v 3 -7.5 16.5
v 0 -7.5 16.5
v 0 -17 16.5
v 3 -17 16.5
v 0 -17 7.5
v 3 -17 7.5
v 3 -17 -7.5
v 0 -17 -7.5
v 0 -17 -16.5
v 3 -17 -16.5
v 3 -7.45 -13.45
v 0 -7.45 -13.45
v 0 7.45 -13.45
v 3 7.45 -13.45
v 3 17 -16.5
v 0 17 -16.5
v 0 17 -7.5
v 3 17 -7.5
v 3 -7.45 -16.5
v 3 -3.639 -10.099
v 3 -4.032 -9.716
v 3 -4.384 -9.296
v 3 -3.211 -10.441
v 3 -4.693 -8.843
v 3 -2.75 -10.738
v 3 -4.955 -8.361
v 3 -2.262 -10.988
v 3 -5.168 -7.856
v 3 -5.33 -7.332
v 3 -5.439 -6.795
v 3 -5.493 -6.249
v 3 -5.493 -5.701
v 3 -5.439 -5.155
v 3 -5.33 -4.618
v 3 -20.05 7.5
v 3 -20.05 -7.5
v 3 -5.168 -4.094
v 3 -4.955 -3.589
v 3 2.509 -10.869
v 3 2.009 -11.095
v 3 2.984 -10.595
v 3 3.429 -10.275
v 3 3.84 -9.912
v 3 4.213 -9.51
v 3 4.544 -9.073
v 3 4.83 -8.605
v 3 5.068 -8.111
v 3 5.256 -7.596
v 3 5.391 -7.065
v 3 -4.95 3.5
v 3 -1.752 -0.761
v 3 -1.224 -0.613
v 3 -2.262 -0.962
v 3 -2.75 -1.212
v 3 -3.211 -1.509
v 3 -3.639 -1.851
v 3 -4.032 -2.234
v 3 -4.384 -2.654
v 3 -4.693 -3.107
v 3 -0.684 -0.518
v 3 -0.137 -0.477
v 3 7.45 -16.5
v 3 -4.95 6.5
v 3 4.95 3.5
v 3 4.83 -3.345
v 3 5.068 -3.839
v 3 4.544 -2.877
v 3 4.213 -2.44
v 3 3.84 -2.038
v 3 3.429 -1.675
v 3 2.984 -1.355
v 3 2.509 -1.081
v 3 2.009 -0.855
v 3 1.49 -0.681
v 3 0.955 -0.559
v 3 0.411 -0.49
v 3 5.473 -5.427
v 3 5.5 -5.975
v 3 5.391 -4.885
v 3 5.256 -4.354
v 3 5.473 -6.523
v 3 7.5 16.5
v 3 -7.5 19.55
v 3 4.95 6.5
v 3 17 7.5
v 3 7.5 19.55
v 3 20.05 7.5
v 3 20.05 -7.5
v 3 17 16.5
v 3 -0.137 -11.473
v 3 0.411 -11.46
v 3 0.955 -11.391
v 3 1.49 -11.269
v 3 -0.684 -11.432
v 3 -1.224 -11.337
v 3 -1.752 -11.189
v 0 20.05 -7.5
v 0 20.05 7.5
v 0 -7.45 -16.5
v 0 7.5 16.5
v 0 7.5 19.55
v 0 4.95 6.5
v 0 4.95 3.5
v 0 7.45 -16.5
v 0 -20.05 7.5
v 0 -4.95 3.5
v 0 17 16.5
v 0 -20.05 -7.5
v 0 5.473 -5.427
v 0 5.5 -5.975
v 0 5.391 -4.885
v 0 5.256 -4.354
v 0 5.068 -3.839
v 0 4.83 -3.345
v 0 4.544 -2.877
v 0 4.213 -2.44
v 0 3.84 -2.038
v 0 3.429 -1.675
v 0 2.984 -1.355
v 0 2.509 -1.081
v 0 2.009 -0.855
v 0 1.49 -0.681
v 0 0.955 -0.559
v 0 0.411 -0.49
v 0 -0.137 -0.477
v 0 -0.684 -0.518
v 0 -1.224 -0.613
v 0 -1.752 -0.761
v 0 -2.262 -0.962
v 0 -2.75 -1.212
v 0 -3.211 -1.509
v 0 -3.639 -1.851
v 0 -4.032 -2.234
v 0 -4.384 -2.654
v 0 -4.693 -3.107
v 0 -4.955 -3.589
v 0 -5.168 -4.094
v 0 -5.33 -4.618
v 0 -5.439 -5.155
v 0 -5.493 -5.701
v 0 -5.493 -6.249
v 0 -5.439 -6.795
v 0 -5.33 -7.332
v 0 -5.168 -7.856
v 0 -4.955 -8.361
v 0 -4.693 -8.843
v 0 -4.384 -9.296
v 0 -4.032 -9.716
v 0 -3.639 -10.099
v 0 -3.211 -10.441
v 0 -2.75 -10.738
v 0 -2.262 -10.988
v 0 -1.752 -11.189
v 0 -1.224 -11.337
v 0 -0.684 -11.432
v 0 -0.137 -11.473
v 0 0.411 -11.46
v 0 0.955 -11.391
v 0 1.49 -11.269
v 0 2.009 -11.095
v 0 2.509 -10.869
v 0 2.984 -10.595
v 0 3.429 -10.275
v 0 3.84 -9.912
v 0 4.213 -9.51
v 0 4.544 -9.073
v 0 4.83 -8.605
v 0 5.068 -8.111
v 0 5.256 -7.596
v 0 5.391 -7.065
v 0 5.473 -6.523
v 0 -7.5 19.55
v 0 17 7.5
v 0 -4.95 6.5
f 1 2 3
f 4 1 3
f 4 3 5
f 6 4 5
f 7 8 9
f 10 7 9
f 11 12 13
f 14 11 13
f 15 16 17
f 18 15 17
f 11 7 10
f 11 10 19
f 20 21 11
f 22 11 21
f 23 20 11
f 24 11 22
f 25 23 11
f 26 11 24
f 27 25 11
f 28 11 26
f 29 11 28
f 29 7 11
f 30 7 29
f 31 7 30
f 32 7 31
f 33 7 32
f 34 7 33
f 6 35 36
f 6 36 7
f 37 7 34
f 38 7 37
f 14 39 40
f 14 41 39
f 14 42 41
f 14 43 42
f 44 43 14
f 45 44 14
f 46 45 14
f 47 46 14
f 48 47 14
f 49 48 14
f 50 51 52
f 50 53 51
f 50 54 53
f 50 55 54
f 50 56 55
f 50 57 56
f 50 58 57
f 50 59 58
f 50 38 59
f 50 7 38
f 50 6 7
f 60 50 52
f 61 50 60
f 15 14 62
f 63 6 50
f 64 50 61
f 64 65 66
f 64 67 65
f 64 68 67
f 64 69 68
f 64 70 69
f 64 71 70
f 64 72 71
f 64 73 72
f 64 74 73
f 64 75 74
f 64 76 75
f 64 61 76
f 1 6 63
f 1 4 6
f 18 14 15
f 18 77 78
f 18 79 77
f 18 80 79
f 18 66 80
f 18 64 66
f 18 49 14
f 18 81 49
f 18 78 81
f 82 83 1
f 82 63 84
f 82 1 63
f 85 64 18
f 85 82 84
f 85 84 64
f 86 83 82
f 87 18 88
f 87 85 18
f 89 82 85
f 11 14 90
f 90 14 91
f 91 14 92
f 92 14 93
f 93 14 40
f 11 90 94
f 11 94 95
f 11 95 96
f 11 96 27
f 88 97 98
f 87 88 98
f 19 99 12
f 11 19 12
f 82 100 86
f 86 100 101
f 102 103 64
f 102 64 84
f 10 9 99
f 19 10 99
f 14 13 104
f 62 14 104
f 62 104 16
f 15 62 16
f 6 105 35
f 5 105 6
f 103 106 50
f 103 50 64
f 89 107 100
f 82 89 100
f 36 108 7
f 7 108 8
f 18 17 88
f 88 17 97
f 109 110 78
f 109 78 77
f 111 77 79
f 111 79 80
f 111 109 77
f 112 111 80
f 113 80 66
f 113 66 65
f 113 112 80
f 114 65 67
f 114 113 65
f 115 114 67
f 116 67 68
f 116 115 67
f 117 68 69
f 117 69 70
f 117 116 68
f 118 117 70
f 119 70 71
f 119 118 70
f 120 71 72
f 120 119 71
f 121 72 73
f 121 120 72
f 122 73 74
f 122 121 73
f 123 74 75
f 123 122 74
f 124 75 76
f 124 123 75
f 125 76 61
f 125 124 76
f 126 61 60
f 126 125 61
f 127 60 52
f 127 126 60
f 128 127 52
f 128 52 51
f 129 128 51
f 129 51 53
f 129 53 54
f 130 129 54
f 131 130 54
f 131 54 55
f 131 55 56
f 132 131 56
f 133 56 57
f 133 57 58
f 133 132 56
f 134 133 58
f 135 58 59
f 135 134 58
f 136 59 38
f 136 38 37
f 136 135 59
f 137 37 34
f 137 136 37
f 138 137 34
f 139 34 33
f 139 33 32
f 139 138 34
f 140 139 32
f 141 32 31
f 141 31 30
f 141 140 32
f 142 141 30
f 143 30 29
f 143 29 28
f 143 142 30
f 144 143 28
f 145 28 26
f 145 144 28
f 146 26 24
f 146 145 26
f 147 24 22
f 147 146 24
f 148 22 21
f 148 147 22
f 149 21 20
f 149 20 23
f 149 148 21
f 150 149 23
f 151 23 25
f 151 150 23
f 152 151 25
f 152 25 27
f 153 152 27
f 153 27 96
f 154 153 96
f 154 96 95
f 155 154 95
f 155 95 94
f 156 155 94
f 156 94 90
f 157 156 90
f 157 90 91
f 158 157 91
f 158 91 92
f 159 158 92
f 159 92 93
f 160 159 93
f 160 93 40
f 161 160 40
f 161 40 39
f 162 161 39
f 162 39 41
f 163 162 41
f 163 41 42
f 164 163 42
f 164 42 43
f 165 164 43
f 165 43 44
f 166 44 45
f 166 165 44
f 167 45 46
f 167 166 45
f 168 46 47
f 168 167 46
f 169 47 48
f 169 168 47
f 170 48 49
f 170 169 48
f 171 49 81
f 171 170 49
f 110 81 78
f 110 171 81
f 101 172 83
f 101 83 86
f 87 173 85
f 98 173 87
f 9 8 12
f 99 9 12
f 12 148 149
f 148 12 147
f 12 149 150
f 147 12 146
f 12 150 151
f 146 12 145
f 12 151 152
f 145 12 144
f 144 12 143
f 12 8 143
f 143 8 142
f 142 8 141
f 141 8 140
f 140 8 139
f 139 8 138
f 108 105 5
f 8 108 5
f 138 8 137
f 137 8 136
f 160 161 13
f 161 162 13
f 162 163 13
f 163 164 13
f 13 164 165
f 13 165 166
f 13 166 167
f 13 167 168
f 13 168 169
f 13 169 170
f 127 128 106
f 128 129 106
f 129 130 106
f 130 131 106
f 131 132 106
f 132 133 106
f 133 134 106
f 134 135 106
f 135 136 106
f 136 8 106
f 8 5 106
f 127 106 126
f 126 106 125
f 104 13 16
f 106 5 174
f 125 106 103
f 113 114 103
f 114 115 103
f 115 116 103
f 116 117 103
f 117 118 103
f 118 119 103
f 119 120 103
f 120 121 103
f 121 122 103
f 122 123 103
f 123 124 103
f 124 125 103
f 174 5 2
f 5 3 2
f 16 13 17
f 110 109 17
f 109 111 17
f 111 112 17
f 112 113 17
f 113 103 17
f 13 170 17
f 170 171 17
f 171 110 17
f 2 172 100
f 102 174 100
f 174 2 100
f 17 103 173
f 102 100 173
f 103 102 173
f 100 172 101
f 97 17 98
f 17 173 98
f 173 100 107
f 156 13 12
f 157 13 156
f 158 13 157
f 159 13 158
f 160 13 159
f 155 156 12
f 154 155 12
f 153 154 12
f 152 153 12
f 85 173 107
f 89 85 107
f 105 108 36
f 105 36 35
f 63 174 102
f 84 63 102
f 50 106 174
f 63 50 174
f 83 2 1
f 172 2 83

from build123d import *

# Parameters (mm, degrees)
F0_R     = 5.5
F0_W     = 9.9
F0_H     = 3
F0_W_2   = 15
F0_H_2   = 3.05
F0_W_3   = 3.05
F0_H_3   = 15
F1_DEPTH = 3


with BuildPart() as f1:
    # F0 (on Right) → F1 (new body)
    with BuildSketch(Plane.YZ):
        Polygon((17, 7.5), (17, 16.5), (7.5, 16.5), (-7.5, 16.5), (-17, 16.5), (-17, 7.5), (-17, -7.5), (-17, -16.5), (-7.45, -16.5), (-7.45, -13.45), (7.45, -13.45), (7.45, -16.5), (17, -16.5), (17, -7.5), align=None)
        with Locations((0, -5.975)):
            Circle(F0_R, mode=Mode.SUBTRACT)
        with Locations((0, 5)):
            Rectangle(F0_W, F0_H, mode=Mode.SUBTRACT)
        with Locations((0, 18.025)):
            Rectangle(F0_W_2, F0_H_2)
        with Locations((-18.525, 0)):
            Rectangle(F0_W_3, F0_H_3)
        with Locations((18.525, 0)):
            Rectangle(F0_W_3, F0_H_3)
    extrude(amount=F1_DEPTH)


solid = f1.part
